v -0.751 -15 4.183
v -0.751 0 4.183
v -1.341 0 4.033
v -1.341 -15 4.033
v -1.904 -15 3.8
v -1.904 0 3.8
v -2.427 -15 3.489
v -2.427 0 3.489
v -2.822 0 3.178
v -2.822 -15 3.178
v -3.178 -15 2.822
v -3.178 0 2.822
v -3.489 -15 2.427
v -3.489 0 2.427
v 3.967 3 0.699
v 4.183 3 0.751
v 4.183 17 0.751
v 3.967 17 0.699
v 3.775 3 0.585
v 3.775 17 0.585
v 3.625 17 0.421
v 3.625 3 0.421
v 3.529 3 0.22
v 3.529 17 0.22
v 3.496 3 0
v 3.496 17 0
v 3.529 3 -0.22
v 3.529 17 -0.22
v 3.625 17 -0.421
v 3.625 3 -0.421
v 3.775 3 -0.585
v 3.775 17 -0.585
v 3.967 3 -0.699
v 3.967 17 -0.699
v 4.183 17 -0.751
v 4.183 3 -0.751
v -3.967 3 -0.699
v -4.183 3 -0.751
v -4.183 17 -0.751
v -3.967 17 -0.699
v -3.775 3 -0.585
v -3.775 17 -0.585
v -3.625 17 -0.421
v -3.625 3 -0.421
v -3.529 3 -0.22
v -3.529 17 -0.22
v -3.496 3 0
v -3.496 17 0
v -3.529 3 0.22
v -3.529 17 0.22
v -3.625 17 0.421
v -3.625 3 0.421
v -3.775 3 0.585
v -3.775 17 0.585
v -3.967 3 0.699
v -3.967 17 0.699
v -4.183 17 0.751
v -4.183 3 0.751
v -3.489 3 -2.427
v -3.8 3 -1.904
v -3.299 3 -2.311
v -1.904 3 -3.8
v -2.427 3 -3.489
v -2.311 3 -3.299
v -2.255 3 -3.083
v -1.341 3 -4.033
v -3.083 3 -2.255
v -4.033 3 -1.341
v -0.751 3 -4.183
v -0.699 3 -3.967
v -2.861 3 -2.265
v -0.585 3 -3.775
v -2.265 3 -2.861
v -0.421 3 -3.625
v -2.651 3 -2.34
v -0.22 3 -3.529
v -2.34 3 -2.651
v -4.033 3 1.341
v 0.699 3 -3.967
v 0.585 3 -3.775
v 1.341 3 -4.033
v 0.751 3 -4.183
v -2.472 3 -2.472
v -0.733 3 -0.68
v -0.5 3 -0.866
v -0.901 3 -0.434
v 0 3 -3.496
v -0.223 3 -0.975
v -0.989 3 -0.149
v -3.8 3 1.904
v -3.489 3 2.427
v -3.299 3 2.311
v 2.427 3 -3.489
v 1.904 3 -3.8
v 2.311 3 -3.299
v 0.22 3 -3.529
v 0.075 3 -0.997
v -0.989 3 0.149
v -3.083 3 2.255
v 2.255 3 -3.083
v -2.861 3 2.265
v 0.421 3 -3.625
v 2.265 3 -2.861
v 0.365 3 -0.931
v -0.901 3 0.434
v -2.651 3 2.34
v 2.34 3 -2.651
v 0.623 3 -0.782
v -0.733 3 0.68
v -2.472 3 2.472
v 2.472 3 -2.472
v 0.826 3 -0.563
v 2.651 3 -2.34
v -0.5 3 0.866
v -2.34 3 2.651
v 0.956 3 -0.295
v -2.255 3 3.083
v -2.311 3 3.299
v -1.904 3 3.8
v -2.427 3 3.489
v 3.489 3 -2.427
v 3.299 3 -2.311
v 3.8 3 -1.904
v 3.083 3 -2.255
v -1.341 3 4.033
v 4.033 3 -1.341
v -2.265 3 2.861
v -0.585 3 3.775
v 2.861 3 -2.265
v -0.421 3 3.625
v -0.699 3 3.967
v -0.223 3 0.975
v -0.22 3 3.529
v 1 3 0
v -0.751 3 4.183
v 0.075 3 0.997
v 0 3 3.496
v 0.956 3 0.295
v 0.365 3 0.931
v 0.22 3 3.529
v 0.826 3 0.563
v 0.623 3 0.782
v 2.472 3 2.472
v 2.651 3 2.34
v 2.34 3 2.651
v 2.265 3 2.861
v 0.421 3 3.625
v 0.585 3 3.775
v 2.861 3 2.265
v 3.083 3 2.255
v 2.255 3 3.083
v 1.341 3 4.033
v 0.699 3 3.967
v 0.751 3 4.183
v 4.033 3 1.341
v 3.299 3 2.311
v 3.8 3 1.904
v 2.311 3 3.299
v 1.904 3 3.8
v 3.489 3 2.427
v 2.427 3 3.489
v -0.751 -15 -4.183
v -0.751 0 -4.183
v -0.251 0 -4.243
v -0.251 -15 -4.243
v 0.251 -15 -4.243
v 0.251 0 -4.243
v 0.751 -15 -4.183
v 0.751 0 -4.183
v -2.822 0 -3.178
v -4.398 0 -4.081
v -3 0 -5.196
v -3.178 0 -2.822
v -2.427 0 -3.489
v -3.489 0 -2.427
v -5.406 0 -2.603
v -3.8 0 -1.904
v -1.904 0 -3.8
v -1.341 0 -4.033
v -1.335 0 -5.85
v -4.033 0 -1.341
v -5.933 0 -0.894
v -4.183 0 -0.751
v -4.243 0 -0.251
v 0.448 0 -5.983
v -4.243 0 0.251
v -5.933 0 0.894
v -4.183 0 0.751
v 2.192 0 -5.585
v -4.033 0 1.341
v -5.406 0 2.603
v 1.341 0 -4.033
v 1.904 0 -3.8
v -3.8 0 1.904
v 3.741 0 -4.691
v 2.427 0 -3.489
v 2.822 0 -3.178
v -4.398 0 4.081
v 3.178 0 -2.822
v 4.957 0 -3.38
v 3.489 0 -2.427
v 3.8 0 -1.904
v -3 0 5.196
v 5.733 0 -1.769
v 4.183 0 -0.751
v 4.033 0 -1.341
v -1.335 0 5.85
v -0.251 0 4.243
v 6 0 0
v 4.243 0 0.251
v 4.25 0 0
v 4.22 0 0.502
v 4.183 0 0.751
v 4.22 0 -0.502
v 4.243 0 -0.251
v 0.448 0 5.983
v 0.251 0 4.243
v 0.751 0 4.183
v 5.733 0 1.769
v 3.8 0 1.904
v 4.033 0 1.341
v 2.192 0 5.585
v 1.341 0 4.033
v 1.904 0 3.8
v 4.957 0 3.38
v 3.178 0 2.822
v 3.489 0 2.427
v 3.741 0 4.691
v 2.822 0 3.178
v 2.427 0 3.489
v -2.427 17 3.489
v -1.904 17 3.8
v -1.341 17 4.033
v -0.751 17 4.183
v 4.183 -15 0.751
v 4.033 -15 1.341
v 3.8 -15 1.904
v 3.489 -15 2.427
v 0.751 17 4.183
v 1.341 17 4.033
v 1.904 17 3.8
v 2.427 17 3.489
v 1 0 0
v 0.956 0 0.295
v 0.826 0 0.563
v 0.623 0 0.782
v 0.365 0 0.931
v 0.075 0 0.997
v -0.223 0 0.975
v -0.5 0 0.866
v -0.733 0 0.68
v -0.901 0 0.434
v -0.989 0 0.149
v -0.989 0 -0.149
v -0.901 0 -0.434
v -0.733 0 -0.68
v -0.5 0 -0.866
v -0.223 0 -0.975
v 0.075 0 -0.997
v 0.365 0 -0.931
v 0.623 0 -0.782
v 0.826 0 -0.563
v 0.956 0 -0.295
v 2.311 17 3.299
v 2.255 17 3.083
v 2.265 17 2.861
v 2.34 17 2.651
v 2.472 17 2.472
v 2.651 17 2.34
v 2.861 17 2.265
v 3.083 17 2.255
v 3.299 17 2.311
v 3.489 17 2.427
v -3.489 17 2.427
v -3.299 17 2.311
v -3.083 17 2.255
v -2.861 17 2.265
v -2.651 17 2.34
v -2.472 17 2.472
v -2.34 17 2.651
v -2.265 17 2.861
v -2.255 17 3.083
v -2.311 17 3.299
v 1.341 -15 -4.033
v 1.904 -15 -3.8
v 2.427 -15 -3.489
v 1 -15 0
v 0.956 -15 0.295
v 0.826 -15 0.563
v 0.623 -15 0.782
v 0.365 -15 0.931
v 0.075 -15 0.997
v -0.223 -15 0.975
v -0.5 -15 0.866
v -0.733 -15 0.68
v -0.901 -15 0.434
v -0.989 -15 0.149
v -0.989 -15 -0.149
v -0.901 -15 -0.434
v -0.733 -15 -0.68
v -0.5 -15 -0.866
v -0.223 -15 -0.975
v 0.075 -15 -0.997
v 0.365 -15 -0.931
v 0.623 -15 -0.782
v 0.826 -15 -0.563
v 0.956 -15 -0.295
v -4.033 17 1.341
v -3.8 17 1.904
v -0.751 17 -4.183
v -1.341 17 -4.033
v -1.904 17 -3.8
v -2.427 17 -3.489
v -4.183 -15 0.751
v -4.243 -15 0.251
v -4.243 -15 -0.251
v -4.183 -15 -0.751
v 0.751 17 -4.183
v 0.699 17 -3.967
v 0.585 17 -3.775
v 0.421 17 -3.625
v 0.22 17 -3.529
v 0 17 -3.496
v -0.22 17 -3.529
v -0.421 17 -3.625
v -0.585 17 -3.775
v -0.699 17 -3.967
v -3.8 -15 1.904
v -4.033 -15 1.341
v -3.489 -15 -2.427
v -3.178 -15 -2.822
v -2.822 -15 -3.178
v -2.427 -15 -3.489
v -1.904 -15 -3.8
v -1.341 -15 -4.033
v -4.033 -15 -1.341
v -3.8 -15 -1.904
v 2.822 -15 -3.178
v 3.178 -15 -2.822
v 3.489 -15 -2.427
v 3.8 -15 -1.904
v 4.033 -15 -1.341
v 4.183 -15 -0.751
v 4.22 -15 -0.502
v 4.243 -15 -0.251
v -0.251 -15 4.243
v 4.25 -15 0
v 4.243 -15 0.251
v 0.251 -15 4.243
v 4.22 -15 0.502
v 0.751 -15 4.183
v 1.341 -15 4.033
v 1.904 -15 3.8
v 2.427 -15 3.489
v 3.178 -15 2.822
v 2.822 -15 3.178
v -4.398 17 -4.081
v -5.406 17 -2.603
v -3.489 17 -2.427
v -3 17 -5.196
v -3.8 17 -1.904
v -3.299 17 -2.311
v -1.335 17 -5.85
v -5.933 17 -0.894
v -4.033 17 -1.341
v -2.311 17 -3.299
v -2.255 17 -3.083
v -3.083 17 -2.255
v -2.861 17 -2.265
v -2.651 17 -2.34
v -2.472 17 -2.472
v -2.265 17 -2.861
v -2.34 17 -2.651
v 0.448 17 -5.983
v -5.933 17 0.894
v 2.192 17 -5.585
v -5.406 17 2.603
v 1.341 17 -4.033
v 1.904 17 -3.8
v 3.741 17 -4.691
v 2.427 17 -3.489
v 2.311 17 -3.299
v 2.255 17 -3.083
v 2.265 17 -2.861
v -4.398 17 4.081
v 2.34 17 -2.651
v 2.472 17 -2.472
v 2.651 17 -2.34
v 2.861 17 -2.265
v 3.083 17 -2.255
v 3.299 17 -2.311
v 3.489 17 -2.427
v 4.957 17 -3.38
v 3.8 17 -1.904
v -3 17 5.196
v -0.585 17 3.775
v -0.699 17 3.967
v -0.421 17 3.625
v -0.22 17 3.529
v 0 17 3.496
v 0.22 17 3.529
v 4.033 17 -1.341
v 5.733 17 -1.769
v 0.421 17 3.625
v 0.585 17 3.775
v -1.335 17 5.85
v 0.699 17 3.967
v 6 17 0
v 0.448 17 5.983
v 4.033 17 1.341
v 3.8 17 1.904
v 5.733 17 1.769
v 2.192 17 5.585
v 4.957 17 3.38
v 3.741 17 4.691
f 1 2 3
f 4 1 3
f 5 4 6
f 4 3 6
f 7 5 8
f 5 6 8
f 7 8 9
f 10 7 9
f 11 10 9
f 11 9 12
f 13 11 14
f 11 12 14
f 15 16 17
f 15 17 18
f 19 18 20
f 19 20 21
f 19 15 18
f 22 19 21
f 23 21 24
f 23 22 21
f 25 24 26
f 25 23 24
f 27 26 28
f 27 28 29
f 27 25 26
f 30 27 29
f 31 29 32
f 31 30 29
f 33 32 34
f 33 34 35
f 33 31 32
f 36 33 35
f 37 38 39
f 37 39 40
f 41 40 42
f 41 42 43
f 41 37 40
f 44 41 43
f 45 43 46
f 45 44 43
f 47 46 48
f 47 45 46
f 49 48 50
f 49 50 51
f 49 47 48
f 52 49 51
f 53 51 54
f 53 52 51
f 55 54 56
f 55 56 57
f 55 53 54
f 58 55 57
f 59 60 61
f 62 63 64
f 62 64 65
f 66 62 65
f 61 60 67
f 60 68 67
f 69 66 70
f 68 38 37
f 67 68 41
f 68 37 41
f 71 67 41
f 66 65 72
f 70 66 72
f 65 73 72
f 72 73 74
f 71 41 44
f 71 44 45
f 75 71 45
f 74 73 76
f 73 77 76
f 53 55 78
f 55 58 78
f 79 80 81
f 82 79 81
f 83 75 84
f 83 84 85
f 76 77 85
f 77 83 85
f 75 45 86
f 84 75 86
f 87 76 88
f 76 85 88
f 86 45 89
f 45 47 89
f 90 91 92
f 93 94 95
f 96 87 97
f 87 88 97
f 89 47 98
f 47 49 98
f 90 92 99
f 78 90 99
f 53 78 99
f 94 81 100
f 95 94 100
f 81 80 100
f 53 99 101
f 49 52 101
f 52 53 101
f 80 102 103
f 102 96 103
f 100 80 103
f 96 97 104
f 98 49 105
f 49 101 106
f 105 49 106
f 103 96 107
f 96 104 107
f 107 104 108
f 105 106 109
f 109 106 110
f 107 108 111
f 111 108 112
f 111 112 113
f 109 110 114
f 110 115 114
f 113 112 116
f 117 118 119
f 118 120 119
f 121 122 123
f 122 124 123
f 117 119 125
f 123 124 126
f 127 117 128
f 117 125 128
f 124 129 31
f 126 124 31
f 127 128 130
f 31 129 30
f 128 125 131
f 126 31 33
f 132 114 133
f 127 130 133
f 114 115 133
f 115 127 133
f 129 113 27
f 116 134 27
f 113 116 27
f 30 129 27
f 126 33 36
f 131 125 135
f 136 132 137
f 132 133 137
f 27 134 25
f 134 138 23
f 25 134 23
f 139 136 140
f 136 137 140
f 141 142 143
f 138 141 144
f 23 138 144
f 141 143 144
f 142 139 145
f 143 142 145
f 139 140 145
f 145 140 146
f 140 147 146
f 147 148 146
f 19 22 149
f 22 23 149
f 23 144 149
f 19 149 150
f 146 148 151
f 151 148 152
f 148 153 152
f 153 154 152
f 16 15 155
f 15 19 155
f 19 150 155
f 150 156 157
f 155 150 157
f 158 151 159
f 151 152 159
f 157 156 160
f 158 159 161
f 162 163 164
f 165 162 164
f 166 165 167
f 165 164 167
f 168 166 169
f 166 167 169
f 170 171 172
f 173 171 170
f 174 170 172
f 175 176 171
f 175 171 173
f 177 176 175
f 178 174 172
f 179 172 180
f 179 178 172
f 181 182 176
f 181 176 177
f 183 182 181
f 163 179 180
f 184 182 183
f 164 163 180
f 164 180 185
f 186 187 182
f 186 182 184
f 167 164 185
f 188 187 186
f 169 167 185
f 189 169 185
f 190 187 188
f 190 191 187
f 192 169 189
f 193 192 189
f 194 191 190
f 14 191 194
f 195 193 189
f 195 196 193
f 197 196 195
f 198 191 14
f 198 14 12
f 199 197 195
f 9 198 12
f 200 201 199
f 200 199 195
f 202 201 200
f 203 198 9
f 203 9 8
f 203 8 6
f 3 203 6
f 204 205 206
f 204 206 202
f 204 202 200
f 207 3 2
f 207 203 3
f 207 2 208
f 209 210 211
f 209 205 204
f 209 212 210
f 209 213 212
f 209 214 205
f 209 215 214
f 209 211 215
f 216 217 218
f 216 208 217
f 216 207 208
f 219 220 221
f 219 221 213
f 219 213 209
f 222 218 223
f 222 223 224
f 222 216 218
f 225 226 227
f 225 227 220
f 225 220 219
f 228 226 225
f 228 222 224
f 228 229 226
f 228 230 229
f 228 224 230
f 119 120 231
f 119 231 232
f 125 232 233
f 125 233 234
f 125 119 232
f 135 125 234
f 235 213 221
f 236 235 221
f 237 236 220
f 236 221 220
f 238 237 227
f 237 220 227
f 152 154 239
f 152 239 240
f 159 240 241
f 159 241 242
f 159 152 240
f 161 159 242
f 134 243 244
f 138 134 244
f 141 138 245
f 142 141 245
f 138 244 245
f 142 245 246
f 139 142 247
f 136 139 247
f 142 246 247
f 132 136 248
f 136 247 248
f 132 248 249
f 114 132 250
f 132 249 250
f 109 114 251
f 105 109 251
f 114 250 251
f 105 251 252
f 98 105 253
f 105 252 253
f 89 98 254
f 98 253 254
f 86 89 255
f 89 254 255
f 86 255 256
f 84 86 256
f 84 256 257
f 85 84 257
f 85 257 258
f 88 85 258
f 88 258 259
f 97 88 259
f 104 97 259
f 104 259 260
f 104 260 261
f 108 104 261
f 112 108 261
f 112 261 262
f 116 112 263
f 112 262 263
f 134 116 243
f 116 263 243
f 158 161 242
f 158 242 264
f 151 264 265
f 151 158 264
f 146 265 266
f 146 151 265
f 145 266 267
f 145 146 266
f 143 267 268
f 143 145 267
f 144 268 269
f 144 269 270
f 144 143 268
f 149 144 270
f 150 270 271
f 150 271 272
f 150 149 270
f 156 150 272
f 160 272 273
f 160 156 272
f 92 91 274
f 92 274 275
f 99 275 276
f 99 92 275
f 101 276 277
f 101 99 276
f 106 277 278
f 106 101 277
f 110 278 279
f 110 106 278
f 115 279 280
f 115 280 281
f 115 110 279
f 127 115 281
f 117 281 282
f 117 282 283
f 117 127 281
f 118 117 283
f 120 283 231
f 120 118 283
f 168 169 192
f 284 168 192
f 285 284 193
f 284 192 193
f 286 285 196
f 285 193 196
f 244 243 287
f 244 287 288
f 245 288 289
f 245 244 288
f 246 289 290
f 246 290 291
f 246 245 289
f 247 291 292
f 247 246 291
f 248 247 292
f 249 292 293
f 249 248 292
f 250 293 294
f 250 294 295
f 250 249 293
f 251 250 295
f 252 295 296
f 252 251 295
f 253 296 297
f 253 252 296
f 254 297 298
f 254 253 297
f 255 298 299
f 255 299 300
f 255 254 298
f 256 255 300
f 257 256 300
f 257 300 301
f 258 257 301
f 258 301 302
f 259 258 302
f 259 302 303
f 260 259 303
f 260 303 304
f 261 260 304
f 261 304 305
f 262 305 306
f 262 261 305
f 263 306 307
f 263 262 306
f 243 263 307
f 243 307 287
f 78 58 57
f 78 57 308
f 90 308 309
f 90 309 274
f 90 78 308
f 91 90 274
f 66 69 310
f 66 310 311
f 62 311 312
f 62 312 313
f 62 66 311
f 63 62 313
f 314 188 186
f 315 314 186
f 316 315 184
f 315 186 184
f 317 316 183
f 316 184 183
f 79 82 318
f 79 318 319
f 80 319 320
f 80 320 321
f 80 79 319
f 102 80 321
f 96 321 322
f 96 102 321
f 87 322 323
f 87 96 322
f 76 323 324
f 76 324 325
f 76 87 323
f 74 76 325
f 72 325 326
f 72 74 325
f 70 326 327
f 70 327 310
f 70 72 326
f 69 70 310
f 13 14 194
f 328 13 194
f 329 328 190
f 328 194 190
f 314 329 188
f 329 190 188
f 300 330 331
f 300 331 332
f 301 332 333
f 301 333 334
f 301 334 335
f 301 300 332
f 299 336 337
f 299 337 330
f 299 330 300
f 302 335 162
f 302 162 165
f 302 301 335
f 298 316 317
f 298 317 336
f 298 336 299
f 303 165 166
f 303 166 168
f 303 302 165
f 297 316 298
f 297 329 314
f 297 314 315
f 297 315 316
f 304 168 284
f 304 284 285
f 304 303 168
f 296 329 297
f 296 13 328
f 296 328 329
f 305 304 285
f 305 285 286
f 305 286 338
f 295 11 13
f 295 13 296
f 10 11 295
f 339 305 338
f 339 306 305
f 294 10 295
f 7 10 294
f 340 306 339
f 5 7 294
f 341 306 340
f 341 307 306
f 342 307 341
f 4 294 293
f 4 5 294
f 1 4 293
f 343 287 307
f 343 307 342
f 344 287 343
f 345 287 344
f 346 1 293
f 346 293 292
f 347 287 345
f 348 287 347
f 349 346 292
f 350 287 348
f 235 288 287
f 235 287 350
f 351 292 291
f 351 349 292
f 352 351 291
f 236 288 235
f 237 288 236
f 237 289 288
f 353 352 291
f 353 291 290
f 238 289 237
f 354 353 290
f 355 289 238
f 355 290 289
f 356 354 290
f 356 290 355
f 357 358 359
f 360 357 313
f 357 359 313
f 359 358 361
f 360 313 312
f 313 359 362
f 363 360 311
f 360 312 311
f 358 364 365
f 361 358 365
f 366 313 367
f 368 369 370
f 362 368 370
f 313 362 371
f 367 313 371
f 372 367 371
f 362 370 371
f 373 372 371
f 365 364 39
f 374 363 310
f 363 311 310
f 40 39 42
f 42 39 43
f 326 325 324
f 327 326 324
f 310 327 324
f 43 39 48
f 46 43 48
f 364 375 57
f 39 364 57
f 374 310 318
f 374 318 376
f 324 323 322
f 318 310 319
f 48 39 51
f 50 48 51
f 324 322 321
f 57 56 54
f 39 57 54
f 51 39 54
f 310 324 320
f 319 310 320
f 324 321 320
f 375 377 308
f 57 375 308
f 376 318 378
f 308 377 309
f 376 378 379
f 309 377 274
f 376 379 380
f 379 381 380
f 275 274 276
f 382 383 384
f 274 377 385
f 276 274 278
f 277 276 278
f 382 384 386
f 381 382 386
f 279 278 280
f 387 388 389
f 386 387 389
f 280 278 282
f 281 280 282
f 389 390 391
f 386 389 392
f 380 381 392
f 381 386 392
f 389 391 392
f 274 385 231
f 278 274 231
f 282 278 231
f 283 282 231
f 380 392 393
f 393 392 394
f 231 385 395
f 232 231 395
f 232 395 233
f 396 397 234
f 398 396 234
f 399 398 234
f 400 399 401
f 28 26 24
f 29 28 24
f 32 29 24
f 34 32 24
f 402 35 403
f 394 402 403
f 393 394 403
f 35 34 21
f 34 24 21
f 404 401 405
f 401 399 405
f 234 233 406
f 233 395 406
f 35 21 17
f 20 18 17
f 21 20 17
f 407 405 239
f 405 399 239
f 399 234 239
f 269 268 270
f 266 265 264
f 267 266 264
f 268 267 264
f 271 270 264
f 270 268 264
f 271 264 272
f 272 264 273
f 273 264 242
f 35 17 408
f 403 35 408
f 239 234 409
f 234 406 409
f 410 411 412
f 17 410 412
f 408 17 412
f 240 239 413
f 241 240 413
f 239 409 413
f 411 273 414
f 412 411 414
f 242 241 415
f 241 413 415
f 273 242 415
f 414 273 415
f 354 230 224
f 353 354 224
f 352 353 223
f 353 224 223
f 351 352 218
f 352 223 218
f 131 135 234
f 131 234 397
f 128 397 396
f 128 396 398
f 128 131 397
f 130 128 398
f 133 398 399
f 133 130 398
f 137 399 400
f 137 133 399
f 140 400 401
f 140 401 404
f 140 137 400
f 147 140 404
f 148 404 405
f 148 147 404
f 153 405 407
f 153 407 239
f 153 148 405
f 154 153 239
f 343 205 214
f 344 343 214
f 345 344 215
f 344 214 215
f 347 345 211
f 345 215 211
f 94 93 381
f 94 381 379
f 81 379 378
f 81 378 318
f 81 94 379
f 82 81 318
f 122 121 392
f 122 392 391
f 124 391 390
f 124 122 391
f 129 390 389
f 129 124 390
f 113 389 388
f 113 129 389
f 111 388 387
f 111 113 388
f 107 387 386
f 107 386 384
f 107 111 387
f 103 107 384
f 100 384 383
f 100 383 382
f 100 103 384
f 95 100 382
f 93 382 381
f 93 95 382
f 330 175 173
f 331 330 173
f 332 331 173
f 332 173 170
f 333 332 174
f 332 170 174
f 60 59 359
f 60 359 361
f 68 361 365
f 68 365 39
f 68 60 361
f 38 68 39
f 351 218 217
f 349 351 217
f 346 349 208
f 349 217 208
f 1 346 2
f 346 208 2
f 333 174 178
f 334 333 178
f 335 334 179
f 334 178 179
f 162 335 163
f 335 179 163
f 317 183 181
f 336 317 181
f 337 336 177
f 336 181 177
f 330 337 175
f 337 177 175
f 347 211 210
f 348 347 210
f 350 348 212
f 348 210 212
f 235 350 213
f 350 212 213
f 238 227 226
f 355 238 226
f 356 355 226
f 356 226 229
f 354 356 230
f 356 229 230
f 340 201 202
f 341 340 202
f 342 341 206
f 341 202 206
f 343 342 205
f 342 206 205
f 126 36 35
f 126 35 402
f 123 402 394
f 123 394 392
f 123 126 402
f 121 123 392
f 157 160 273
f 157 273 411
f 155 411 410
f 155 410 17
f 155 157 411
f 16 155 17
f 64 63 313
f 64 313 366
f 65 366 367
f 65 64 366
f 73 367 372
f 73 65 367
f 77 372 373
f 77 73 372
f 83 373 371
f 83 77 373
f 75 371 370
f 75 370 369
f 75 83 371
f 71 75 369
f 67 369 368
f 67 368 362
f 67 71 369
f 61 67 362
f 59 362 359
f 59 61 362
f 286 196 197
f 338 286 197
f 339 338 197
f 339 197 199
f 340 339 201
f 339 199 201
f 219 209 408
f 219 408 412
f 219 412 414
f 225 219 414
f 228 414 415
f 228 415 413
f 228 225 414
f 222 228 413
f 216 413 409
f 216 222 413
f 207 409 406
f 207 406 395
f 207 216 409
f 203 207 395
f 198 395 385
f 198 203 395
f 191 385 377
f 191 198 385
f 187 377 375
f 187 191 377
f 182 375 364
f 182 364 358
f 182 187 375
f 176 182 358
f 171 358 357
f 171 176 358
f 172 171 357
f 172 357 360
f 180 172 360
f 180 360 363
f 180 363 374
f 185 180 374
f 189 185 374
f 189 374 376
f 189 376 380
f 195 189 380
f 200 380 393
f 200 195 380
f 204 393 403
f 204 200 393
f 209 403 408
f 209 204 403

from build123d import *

# Parameters (mm, degrees)
F0_R          = 6
F1_DEPTH      = 17
F0_R_2        = 2.5
F0_R_3        = 1
F2_DEPTH      = 15
F2_DEPTH_BACK = 3


with BuildPart() as f1:
    # F0 (on Front) → F1 (new body)
    with BuildSketch(Plane.XZ):
        Circle(F0_R)
        with BuildLine():
            ThreePointArc((4.183153, 0.75082), (4.233255, 0.376895), (4.25, 0))
            ThreePointArc((4.25, 0), (4.233255, -0.376895), (4.183153, -0.75082))
            ThreePointArc((4.183153, -0.75082), (3.926488, -1.626405), (3.488846, -2.427026))
            ThreePointArc((3.488846, -2.427026), (3.005204, -3.005204), (2.427026, -3.488846))
            ThreePointArc((2.427026, -3.488846), (1.626405, -3.926488), (0.75082, -4.183153))
            ThreePointArc((0.75082, -4.183153), (0, -4.25), (-0.75082, -4.183153))
            ThreePointArc((-0.75082, -4.183153), (-1.626405, -3.926488), (-2.427026, -3.488846))
            ThreePointArc((-2.427026, -3.488846), (-3.005204, -3.005204), (-3.488846, -2.427026))
            ThreePointArc((-3.488846, -2.427026), (-3.926488, -1.626405), (-4.183153, -0.75082))
            ThreePointArc((-4.183153, -0.75082), (-4.25, 0), (-4.183153, 0.75082))
            ThreePointArc((-4.183153, 0.75082), (-3.926488, 1.626405), (-3.488846, 2.427026))
            ThreePointArc((-3.488846, 2.427026), (-3.005204, 3.005204), (-2.427026, 3.488846))
            ThreePointArc((-2.427026, 3.488846), (-1.626405, 3.926488), (-0.75082, 4.183153))
            ThreePointArc((-0.75082, 4.183153), (0, 4.25), (0.75082, 4.183153))
            ThreePointArc((0.75082, 4.183153), (1.626405, 3.926488), (2.427026, 3.488846))
            ThreePointArc((2.427026, 3.488846), (3.005204, 3.005204), (3.488846, 2.427026))
            ThreePointArc((3.488846, 2.427026), (3.926488, 1.626405), (4.183153, 0.75082))
        make_face(mode=Mode.SUBTRACT)
        with BuildLine():
            ThreePointArc((4.183153, -0.75082), (4.233255, -0.376895), (4.25, 0))
            ThreePointArc((4.25, 0), (4.233255, 0.376895), (4.183153, 0.75082))
            ThreePointArc((4.183153, 0.75082), (3.496211, 0), (4.183153, -0.75082))
        make_face()
        with BuildLine():
            ThreePointArc((2.427026, 3.488846), (2.472194, 2.472194), (3.488846, 2.427026))
            ThreePointArc((3.488846, 2.427026), (3.005204, 3.005204), (2.427026, 3.488846))
        make_face()
        with BuildLine():
            ThreePointArc((-0.75082, 4.183153), (0, 3.496211), (0.75082, 4.183153))
            ThreePointArc((0.75082, 4.183153), (0, 4.25), (-0.75082, 4.183153))
        make_face()
        with BuildLine():
            ThreePointArc((-3.488846, 2.427026), (-2.472194, 2.472194), (-2.427026, 3.488846))
            ThreePointArc((-2.427026, 3.488846), (-3.005204, 3.005204), (-3.488846, 2.427026))
        make_face()
        with BuildLine():
            ThreePointArc((-4.183153, -0.75082), (-3.496211, 0), (-4.183153, 0.75082))
            ThreePointArc((-4.183153, 0.75082), (-4.25, 0), (-4.183153, -0.75082))
        make_face()
        with BuildLine():
            ThreePointArc((-3.488846, -2.427026), (-3.005204, -3.005204), (-2.427026, -3.488846))
            ThreePointArc((-2.427026, -3.488846), (-2.472194, -2.472194), (-3.488846, -2.427026))
        make_face()
        with BuildLine():
            ThreePointArc((-0.75082, -4.183153), (0, -4.25), (0.75082, -4.183153))
            ThreePointArc((0.75082, -4.183153), (0, -3.496211), (-0.75082, -4.183153))
        make_face()
        with BuildLine():
            ThreePointArc((2.427026, -3.488846), (3.005204, -3.005204), (3.488846, -2.427026))
            ThreePointArc((3.488846, -2.427026), (2.472194, -2.472194), (2.427026, -3.488846))
        make_face()
    extrude(amount=-F1_DEPTH)

    # F0 (on Front) → F2 (join, two sides)
    with BuildSketch(Plane.XZ) as f2_sk:
        with BuildLine():
            ThreePointArc((4.183153, -0.75082), (3.496211, 0), (4.183153, 0.75082))
            ThreePointArc((4.183153, 0.75082), (3.926488, 1.626405), (3.488846, 2.427026))
            ThreePointArc((3.488846, 2.427026), (2.472194, 2.472194), (2.427026, 3.488846))
            ThreePointArc((2.427026, 3.488846), (1.626405, 3.926488), (0.75082, 4.183153))
            ThreePointArc((0.75082, 4.183153), (0, 3.496211), (-0.75082, 4.183153))
            ThreePointArc((-0.75082, 4.183153), (-1.626405, 3.926488), (-2.427026, 3.488846))
            ThreePointArc((-2.427026, 3.488846), (-2.472194, 2.472194), (-3.488846, 2.427026))
            ThreePointArc((-3.488846, 2.427026), (-3.926488, 1.626405), (-4.183153, 0.75082))
            ThreePointArc((-4.183153, 0.75082), (-3.496211, 0), (-4.183153, -0.75082))
            ThreePointArc((-4.183153, -0.75082), (-3.926488, -1.626405), (-3.488846, -2.427026))
            ThreePointArc((-3.488846, -2.427026), (-2.472194, -2.472194), (-2.427026, -3.488846))
            ThreePointArc((-2.427026, -3.488846), (-1.626405, -3.926488), (-0.75082, -4.183153))
            ThreePointArc((-0.75082, -4.183153), (0, -3.496211), (0.75082, -4.183153))
            ThreePointArc((0.75082, -4.183153), (1.626405, -3.926488), (2.427026, -3.488846))
            ThreePointArc((2.427026, -3.488846), (2.472194, -2.472194), (3.488846, -2.427026))
            ThreePointArc((3.488846, -2.427026), (3.926488, -1.626405), (4.183153, -0.75082))
        make_face()
        Circle(F0_R_2, mode=Mode.SUBTRACT)
        Circle(F0_R_2)
        Circle(F0_R_3, mode=Mode.SUBTRACT)
        with BuildLine():
            ThreePointArc((-3.488846, 2.427026), (-2.472194, 2.472194), (-2.427026, 3.488846))
            ThreePointArc((-2.427026, 3.488846), (-3.005204, 3.005204), (-3.488846, 2.427026))
        make_face()
        with BuildLine():
            ThreePointArc((-4.183153, -0.75082), (-3.496211, 0), (-4.183153, 0.75082))
            ThreePointArc((-4.183153, 0.75082), (-4.25, 0), (-4.183153, -0.75082))
        make_face()
        with BuildLine():
            ThreePointArc((-3.488846, -2.427026), (-3.005204, -3.005204), (-2.427026, -3.488846))
            ThreePointArc((-2.427026, -3.488846), (-2.472194, -2.472194), (-3.488846, -2.427026))
        make_face()
        with BuildLine():
            ThreePointArc((-0.75082, -4.183153), (0, -4.25), (0.75082, -4.183153))
            ThreePointArc((0.75082, -4.183153), (0, -3.496211), (-0.75082, -4.183153))
        make_face()
        with BuildLine():
            ThreePointArc((2.427026, -3.488846), (3.005204, -3.005204), (3.488846, -2.427026))
            ThreePointArc((3.488846, -2.427026), (2.472194, -2.472194), (2.427026, -3.488846))
        make_face()
        with BuildLine():
            ThreePointArc((2.427026, 3.488846), (2.472194, 2.472194), (3.488846, 2.427026))
            ThreePointArc((3.488846, 2.427026), (3.005204, 3.005204), (2.427026, 3.488846))
        make_face()
        with BuildLine():
            ThreePointArc((-0.75082, 4.183153), (0, 3.496211), (0.75082, 4.183153))
            ThreePointArc((0.75082, 4.183153), (0, 4.25), (-0.75082, 4.183153))
        make_face()
        with BuildLine():
            ThreePointArc((4.183153, -0.75082), (4.233255, -0.376895), (4.25, 0))
            ThreePointArc((4.25, 0), (4.233255, 0.376895), (4.183153, 0.75082))
            ThreePointArc((4.183153, 0.75082), (3.496211, 0), (4.183153, -0.75082))
        make_face()
    extrude(amount=F2_DEPTH)
    extrude(f2_sk.sketch, amount=-F2_DEPTH_BACK)


solid = f1.part
